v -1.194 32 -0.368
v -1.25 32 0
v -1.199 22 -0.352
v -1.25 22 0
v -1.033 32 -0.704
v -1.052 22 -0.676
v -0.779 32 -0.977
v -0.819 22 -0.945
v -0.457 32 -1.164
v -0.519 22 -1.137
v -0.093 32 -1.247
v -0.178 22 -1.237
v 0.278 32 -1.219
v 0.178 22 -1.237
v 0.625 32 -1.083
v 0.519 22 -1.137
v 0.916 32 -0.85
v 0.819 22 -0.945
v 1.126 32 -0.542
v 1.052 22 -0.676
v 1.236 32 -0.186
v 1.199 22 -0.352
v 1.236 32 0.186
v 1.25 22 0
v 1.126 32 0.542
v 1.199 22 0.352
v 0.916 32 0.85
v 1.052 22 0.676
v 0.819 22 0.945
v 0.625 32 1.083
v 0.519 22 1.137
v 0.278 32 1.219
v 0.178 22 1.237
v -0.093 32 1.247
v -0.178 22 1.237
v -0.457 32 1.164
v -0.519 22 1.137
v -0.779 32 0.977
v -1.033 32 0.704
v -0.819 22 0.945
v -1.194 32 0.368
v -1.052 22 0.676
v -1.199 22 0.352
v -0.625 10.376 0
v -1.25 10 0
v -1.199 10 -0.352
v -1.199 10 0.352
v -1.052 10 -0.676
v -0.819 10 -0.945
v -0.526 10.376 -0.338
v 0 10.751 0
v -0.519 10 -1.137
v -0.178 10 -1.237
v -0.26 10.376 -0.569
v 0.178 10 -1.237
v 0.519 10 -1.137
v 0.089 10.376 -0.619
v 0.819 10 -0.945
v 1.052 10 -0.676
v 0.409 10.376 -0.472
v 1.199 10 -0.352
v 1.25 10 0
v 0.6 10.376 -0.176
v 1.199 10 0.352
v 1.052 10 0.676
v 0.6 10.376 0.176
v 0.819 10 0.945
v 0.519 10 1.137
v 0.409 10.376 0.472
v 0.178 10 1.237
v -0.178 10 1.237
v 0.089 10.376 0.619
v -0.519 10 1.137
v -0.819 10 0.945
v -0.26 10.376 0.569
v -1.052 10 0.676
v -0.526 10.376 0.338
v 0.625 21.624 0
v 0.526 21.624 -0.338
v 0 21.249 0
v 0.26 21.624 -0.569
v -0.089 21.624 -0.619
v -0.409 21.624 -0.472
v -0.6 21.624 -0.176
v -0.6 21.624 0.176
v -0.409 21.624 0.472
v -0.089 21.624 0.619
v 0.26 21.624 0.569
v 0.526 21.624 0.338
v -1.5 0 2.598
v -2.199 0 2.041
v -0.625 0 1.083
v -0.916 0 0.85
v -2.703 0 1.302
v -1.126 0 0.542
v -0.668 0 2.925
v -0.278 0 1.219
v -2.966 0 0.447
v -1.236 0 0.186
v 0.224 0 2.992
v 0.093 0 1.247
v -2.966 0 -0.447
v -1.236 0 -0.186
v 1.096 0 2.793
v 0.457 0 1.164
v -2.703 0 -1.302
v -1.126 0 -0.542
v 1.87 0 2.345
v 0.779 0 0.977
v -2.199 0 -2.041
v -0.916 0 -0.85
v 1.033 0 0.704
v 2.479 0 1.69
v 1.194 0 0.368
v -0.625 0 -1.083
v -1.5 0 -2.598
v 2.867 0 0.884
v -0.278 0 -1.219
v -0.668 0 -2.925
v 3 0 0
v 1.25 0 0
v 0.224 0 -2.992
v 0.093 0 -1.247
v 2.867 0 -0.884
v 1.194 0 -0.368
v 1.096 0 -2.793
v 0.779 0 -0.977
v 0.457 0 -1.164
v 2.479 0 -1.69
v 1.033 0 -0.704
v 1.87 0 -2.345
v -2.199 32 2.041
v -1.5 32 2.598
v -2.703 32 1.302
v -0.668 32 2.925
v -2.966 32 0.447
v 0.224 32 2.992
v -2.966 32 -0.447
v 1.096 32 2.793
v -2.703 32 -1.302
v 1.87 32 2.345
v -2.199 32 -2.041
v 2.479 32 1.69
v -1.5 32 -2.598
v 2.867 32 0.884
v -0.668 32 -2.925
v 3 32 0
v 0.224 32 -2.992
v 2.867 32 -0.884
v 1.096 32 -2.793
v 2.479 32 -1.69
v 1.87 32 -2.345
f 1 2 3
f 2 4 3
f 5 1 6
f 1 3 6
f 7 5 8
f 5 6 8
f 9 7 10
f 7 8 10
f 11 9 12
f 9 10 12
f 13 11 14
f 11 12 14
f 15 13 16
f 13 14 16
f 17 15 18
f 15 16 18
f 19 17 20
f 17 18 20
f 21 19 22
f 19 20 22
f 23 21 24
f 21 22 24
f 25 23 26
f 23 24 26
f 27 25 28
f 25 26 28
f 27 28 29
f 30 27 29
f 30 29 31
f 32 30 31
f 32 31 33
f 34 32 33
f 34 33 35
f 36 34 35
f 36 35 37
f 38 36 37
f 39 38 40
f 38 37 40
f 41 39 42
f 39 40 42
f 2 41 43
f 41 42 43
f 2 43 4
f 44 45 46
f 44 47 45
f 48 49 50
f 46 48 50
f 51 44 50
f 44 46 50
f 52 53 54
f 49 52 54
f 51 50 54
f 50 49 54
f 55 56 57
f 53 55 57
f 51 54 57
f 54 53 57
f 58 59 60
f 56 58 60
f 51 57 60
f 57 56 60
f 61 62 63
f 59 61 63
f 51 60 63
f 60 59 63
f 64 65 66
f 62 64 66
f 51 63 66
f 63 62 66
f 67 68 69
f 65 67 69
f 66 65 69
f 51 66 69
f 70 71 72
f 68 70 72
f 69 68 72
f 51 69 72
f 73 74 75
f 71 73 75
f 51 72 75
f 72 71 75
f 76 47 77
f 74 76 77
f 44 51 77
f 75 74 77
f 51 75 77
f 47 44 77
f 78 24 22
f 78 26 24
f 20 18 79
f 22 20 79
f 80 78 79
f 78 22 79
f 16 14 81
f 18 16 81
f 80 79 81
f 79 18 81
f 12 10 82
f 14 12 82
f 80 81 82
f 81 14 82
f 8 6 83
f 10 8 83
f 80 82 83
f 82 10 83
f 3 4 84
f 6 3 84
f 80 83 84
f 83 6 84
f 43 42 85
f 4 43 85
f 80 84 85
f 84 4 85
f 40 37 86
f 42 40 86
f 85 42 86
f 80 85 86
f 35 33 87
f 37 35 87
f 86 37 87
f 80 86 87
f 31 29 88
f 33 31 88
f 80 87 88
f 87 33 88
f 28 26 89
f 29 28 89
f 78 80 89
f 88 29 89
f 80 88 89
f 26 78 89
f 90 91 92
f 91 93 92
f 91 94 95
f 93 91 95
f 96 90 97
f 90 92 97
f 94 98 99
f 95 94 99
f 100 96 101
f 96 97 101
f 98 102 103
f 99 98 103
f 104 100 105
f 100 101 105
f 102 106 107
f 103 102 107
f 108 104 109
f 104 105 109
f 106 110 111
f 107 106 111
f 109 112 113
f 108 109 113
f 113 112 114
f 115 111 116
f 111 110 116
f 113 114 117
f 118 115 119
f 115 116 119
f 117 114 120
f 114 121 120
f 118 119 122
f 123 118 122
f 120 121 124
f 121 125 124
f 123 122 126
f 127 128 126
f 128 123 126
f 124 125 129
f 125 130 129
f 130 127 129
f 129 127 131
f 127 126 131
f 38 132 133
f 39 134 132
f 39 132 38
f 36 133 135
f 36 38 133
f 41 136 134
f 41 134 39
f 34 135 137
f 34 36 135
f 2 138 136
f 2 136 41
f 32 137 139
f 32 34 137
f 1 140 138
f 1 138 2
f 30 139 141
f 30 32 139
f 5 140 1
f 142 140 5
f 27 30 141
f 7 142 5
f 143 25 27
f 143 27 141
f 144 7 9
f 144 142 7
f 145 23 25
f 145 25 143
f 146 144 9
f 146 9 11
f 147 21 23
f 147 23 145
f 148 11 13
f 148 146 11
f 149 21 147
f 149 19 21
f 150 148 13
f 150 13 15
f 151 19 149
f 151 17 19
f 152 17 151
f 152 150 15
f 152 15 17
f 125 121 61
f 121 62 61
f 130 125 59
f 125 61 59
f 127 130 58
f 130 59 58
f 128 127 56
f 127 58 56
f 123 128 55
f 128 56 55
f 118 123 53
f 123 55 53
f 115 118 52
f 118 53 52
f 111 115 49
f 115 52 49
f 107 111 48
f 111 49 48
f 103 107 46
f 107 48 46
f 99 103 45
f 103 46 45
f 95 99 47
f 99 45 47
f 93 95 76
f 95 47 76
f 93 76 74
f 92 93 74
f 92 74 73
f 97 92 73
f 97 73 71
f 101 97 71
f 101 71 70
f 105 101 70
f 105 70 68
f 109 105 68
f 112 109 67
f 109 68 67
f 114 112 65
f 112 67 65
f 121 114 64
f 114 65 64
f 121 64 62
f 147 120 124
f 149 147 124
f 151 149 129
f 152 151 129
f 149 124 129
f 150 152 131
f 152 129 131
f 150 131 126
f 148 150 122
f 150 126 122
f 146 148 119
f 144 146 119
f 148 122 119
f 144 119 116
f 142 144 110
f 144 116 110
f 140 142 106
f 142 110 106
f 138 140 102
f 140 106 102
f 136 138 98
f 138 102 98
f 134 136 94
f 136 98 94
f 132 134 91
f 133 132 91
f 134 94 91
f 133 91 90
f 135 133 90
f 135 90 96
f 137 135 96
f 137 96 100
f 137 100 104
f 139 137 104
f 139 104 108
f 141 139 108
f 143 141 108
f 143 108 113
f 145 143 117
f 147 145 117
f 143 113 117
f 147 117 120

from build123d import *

# Parameters (mm, degrees)
SKETCH1_R                   = 3
BOSS_EXTRUDE1_DEPTH         = 32
TAP_DRILL_FOR_M3_TAP1_D     = 2.5
TAP_DRILL_FOR_M3_TAP1_DEPTH = 10
TAP_DRILL_FOR_M3_TAP1_TIP   = 0.751075774
TAP_DRILL_FOR_M3_TAP2_D     = 2.5
TAP_DRILL_FOR_M3_TAP2_DEPTH = 10
TAP_DRILL_FOR_M3_TAP2_TIP   = 0.751075774


with BuildPart() as part:
    # Sketch1 → Boss-Extrude1 (new body)
    with BuildSketch(Plane(origin=(0, 0, 0), x_dir=(1, 0, 0), z_dir=(0, 1, 0))):
        Circle(SKETCH1_R)
    extrude(amount=BOSS_EXTRUDE1_DEPTH)

    # Tap Drill for M3 Tap1
    with Locations(Plane(origin=(0, 32, 0), x_dir=(1, 0, 0), z_dir=(0, 1, 0))):
        with Locations((0, 0)):
            Hole(TAP_DRILL_FOR_M3_TAP1_D / 2, depth=TAP_DRILL_FOR_M3_TAP1_DEPTH)
            with Locations((0, 0, -(TAP_DRILL_FOR_M3_TAP1_DEPTH + TAP_DRILL_FOR_M3_TAP1_TIP / 2))):  # 118° drill point
                Cone(0, TAP_DRILL_FOR_M3_TAP1_D / 2, TAP_DRILL_FOR_M3_TAP1_TIP, mode=Mode.SUBTRACT)

    # Tap Drill for M3 Tap2
    with Locations(Plane(origin=(0, 0, 0), x_dir=(-1, 0, 0), z_dir=(0, -1, 0))):
        with Locations((0, 0)):
            Hole(TAP_DRILL_FOR_M3_TAP2_D / 2, depth=TAP_DRILL_FOR_M3_TAP2_DEPTH)
            with Locations((0, 0, -(TAP_DRILL_FOR_M3_TAP2_DEPTH + TAP_DRILL_FOR_M3_TAP2_TIP / 2))):  # 118° drill point
                Cone(0, TAP_DRILL_FOR_M3_TAP2_D / 2, TAP_DRILL_FOR_M3_TAP2_TIP, mode=Mode.SUBTRACT)


solid = part.part
